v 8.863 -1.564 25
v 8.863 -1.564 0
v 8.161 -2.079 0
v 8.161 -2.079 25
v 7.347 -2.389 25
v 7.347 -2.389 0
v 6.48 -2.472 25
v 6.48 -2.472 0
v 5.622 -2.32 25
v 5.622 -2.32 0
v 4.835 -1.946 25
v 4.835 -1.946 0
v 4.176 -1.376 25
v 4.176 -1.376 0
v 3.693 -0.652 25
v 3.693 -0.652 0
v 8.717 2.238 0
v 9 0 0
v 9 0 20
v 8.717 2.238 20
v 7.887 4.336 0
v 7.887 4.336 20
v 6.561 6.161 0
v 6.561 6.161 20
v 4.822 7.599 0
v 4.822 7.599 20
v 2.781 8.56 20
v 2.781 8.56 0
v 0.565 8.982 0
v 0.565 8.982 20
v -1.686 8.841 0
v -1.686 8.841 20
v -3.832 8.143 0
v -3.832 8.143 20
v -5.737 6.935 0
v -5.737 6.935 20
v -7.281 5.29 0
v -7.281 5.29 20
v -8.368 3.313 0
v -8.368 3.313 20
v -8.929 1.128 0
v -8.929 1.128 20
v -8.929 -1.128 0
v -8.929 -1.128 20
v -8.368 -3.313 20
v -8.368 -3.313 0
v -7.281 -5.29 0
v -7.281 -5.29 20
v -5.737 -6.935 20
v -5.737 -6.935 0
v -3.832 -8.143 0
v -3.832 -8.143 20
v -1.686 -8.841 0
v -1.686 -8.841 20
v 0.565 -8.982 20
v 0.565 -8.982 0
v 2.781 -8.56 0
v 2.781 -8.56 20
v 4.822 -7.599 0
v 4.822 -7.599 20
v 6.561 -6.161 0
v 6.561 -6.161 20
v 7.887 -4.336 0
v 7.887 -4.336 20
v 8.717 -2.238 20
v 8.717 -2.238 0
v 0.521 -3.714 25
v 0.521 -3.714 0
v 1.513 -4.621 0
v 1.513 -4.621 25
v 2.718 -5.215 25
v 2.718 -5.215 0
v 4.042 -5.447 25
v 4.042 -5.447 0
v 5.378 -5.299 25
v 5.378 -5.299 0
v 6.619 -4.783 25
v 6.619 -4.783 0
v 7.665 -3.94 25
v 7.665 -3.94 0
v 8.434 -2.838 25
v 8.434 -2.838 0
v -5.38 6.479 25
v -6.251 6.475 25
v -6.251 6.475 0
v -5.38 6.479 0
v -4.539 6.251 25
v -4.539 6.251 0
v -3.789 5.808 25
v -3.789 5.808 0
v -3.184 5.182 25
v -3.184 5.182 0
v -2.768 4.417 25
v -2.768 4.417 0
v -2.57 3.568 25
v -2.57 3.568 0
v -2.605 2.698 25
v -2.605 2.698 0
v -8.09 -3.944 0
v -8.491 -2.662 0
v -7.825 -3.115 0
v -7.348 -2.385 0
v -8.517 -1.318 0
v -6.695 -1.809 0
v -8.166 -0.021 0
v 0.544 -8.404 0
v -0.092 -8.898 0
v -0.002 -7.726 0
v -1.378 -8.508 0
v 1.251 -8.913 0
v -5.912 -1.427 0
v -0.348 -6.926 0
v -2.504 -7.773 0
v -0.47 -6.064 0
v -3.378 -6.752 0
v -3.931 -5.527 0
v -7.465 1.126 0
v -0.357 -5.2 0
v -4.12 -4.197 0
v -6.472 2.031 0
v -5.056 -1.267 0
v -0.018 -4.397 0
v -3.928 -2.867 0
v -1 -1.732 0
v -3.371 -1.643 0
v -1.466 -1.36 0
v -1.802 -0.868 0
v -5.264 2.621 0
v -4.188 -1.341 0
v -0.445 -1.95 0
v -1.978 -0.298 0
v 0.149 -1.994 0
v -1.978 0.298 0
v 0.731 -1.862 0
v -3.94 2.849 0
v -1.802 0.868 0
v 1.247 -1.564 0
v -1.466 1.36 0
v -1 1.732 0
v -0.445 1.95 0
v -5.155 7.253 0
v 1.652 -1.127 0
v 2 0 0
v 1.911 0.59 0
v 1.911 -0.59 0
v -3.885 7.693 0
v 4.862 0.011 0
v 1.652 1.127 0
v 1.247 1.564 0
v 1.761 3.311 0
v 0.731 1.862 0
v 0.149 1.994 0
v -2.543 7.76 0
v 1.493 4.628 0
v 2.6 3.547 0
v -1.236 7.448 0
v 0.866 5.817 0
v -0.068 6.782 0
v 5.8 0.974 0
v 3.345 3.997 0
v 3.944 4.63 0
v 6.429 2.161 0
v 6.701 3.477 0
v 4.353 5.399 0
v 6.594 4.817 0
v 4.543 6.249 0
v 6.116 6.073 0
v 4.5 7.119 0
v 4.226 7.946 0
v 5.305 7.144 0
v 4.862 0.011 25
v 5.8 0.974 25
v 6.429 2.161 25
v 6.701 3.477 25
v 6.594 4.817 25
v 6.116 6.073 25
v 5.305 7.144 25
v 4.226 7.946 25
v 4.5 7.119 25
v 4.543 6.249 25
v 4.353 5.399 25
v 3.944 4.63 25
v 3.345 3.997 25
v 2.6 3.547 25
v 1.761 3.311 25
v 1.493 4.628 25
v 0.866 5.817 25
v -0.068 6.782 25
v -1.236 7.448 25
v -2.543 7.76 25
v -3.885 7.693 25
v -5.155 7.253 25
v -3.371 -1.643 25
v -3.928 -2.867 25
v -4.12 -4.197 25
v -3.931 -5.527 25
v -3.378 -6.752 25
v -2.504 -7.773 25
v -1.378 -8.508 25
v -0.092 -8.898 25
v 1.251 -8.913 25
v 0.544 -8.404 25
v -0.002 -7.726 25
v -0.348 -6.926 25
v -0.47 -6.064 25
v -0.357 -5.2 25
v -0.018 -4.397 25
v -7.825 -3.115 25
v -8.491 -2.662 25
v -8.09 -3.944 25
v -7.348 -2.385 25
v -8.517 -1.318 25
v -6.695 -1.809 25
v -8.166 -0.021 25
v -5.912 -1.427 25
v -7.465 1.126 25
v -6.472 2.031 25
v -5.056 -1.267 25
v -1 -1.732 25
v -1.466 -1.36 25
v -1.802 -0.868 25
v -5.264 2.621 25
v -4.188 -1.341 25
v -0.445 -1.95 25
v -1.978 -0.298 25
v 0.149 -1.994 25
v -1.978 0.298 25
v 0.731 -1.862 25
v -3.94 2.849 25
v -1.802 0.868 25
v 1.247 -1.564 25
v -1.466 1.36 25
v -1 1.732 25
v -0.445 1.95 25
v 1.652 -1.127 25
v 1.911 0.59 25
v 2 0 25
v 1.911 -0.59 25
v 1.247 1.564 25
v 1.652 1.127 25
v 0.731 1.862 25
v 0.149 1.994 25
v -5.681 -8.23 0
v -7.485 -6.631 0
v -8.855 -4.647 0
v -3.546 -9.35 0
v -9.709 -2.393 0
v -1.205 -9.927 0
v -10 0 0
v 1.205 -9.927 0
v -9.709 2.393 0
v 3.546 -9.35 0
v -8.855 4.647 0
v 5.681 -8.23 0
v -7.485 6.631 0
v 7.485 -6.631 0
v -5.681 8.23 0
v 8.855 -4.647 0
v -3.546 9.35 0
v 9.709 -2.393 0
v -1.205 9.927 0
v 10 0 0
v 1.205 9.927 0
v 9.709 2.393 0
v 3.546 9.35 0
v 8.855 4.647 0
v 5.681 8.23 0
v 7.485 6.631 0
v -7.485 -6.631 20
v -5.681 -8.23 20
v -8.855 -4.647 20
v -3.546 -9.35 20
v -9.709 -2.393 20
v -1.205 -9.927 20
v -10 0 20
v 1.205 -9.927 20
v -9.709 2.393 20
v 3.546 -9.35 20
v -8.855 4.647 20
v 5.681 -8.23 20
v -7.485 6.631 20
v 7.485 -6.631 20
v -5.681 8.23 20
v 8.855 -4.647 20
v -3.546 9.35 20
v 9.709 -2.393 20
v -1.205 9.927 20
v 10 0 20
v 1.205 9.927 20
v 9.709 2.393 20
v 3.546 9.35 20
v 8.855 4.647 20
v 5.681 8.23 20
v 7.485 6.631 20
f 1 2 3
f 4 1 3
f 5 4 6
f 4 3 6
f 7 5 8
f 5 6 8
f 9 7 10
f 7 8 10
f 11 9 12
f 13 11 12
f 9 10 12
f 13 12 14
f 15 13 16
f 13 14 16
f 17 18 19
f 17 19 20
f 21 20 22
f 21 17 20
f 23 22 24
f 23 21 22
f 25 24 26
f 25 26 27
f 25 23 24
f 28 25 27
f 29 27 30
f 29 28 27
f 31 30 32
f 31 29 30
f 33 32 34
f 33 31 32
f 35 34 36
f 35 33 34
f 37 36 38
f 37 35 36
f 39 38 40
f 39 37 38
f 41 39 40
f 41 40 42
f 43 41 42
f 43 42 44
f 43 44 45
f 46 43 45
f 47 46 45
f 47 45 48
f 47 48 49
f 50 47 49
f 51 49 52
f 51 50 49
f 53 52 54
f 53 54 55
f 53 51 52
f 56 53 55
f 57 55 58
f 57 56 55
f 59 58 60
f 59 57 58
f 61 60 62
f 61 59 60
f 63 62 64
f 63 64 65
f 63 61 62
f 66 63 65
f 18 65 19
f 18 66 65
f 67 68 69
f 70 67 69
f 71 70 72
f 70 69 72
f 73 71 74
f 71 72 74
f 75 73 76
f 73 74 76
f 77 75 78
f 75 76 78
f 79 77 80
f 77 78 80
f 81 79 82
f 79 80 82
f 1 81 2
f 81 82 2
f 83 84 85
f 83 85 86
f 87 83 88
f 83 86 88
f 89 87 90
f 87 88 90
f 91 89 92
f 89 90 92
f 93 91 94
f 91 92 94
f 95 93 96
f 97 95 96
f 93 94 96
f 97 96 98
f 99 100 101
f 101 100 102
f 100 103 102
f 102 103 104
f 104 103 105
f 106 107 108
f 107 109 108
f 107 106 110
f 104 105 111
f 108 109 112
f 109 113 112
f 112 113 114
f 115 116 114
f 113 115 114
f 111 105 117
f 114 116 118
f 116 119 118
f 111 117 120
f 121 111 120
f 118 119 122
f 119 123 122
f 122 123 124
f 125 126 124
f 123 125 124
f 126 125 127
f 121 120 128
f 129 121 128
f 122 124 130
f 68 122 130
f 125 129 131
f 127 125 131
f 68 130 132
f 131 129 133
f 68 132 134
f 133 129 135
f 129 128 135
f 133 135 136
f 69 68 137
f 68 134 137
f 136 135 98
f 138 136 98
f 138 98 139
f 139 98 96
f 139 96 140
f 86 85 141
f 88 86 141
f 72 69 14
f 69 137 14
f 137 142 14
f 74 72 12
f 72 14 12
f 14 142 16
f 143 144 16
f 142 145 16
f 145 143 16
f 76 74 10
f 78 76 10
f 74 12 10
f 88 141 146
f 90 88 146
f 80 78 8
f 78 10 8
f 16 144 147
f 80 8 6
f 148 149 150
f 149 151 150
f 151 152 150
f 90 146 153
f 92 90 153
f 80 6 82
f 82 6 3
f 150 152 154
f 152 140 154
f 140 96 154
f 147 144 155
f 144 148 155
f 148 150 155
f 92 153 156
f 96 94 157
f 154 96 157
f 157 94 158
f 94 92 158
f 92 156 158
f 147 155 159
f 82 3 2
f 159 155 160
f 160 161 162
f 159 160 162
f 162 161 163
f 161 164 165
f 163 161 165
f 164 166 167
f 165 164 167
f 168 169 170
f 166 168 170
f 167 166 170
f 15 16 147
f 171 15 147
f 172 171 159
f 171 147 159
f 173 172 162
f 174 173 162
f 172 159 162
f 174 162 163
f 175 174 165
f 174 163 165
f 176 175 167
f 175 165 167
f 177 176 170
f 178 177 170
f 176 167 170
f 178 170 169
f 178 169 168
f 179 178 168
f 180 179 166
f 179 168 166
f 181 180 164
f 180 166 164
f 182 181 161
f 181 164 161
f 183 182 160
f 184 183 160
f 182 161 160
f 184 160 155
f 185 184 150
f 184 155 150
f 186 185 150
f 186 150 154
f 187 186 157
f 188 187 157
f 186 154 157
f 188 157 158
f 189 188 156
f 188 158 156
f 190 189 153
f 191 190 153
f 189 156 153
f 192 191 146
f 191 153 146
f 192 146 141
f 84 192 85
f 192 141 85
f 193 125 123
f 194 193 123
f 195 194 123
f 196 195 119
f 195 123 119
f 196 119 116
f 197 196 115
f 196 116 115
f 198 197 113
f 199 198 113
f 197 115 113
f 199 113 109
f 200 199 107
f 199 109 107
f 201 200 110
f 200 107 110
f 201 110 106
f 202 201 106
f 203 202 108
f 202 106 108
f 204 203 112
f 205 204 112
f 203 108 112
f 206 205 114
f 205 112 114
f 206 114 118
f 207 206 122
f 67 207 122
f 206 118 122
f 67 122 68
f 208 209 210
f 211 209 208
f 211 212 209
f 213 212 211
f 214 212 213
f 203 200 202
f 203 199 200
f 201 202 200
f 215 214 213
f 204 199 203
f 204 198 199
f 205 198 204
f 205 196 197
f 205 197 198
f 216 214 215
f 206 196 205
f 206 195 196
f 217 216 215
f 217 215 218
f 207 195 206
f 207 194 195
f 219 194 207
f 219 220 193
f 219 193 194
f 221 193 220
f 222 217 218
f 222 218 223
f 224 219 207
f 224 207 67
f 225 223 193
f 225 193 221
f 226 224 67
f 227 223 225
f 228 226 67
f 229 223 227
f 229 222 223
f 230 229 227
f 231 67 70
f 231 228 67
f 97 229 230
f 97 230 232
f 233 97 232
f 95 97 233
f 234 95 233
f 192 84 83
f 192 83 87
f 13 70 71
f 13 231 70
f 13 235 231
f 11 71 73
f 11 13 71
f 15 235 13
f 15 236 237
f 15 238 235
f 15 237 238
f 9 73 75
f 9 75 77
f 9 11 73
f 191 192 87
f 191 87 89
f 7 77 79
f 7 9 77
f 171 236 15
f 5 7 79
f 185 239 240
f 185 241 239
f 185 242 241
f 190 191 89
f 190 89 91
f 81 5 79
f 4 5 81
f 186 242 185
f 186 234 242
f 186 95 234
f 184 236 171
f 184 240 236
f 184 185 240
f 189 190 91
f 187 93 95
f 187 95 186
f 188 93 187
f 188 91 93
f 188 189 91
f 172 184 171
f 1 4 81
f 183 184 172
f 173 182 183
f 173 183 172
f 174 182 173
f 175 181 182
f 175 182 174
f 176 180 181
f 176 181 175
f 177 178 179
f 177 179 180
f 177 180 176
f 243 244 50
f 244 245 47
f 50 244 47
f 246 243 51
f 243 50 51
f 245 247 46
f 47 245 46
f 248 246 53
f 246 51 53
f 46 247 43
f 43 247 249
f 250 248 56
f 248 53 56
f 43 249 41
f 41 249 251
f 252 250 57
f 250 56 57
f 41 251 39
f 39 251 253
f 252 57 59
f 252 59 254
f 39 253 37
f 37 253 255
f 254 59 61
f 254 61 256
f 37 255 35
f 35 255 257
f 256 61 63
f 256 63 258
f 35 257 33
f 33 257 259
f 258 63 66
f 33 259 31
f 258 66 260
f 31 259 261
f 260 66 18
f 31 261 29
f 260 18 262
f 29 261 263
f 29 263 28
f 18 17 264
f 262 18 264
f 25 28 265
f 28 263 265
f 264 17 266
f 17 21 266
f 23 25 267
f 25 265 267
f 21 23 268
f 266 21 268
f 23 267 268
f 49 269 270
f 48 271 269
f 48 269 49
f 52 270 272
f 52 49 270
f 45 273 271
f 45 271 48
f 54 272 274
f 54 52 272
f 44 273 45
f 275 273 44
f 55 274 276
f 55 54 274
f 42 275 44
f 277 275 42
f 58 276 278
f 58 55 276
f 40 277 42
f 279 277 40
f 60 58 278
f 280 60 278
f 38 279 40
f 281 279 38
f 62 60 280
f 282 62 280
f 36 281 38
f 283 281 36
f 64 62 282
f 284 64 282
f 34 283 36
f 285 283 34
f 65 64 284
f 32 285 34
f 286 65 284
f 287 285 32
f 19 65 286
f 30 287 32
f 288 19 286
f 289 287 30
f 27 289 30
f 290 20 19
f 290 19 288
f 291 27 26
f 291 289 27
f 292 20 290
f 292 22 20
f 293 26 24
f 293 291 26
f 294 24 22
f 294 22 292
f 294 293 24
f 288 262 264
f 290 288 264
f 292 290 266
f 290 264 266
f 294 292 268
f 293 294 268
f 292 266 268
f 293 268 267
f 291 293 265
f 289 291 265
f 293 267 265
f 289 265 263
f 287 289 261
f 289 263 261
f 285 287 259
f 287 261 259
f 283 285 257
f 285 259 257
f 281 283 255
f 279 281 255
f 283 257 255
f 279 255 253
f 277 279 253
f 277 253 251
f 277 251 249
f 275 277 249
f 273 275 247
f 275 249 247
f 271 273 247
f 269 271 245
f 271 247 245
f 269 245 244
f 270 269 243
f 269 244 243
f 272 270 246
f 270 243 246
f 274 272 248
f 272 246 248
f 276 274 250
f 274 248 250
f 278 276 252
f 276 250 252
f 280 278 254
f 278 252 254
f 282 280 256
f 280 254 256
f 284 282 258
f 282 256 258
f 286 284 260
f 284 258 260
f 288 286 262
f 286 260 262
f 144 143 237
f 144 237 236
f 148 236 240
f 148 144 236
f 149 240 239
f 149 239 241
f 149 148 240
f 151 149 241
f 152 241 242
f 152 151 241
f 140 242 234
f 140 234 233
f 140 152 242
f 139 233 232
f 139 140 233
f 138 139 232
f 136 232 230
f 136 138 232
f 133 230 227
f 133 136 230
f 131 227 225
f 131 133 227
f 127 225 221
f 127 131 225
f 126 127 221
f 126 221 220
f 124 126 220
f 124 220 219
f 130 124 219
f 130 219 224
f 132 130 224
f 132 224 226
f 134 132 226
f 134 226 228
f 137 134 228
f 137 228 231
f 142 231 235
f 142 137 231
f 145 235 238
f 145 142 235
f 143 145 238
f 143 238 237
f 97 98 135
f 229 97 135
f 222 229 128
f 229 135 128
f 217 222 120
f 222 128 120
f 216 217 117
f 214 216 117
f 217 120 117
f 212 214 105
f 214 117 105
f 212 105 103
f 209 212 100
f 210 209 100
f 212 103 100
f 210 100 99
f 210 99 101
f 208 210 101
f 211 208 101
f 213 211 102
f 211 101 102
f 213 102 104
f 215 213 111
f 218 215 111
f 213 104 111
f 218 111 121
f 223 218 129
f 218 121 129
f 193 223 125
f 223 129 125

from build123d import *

# Parameters (mm, degrees)
F0_R     = 10
F0_R_2   = 9
F1_DEPTH = 20
F2_R     = 2
F3_DEPTH = 25


with BuildPart() as f1:
    # F0 (on Top) → F1 (new body)
    with BuildSketch(Plane.XY):
        Circle(F0_R)
        Circle(F0_R_2, mode=Mode.SUBTRACT)
    extrude(amount=F1_DEPTH)


with BuildPart() as f3:
    # F2 (on Top) → F3 (new body)
    with BuildSketch(Plane.XY):
        with BuildLine():
            Line((3.692941, -0.651678), (0.521399, -3.713576))
            ThreePointArc((0.521399, -3.713576), (5.377735, -5.299015), (8.863059, -1.564027))
            ThreePointArc((8.863059, -1.564027), (6.045568, -2.425006), (3.692941, -0.651678))
        make_face()
        Polygon((-3.370699, -1.643438), (0.521399, -3.713576), (3.692941, -0.651678), (1.760964, 3.310816), (-2.604606, 2.697875), align=None)
        Circle(F2_R, mode=Mode.SUBTRACT)
        with BuildLine():
            ThreePointArc((-6.251053, 6.4749), (-3.465584, 5.515367), (-2.604606, 2.697875))
            Line((-2.604606, 2.697875), (1.760964, 3.310816))
            ThreePointArc((1.760964, 3.310816), (-1.235996, 7.447947), (-6.251053, 6.4749))
        make_face()
        with BuildLine():
            Line((1.760964, 3.310816), (3.692941, -0.651678))
            ThreePointArc((3.692941, -0.651678), (6.701475, 3.477044), (4.226314, 7.945959))
            ThreePointArc((4.226314, 7.945959), (4.174501, 5.000308), (1.760964, 3.310816))
        make_face()
        with BuildLine():
            ThreePointArc((-8.089678, -3.944251), (-6.31635, -1.591624), (-3.370699, -1.643438))
            Line((-3.370699, -1.643438), (-2.604606, 2.697875))
            ThreePointArc((-2.604606, 2.697875), (-7.465362, 1.12604), (-8.089678, -3.944251))
        make_face()
        with BuildLine():
            ThreePointArc((1.251358, -8.912581), (-0.438135, -6.499045), (0.521399, -3.713576))
            Line((0.521399, -3.713576), (-3.370699, -1.643438))
            ThreePointArc((-3.370699, -1.643438), (-3.377852, -6.752016), (1.251358, -8.912581))
        make_face()
    extrude(amount=F3_DEPTH)


solid = Compound([f1.part, f3.part])
